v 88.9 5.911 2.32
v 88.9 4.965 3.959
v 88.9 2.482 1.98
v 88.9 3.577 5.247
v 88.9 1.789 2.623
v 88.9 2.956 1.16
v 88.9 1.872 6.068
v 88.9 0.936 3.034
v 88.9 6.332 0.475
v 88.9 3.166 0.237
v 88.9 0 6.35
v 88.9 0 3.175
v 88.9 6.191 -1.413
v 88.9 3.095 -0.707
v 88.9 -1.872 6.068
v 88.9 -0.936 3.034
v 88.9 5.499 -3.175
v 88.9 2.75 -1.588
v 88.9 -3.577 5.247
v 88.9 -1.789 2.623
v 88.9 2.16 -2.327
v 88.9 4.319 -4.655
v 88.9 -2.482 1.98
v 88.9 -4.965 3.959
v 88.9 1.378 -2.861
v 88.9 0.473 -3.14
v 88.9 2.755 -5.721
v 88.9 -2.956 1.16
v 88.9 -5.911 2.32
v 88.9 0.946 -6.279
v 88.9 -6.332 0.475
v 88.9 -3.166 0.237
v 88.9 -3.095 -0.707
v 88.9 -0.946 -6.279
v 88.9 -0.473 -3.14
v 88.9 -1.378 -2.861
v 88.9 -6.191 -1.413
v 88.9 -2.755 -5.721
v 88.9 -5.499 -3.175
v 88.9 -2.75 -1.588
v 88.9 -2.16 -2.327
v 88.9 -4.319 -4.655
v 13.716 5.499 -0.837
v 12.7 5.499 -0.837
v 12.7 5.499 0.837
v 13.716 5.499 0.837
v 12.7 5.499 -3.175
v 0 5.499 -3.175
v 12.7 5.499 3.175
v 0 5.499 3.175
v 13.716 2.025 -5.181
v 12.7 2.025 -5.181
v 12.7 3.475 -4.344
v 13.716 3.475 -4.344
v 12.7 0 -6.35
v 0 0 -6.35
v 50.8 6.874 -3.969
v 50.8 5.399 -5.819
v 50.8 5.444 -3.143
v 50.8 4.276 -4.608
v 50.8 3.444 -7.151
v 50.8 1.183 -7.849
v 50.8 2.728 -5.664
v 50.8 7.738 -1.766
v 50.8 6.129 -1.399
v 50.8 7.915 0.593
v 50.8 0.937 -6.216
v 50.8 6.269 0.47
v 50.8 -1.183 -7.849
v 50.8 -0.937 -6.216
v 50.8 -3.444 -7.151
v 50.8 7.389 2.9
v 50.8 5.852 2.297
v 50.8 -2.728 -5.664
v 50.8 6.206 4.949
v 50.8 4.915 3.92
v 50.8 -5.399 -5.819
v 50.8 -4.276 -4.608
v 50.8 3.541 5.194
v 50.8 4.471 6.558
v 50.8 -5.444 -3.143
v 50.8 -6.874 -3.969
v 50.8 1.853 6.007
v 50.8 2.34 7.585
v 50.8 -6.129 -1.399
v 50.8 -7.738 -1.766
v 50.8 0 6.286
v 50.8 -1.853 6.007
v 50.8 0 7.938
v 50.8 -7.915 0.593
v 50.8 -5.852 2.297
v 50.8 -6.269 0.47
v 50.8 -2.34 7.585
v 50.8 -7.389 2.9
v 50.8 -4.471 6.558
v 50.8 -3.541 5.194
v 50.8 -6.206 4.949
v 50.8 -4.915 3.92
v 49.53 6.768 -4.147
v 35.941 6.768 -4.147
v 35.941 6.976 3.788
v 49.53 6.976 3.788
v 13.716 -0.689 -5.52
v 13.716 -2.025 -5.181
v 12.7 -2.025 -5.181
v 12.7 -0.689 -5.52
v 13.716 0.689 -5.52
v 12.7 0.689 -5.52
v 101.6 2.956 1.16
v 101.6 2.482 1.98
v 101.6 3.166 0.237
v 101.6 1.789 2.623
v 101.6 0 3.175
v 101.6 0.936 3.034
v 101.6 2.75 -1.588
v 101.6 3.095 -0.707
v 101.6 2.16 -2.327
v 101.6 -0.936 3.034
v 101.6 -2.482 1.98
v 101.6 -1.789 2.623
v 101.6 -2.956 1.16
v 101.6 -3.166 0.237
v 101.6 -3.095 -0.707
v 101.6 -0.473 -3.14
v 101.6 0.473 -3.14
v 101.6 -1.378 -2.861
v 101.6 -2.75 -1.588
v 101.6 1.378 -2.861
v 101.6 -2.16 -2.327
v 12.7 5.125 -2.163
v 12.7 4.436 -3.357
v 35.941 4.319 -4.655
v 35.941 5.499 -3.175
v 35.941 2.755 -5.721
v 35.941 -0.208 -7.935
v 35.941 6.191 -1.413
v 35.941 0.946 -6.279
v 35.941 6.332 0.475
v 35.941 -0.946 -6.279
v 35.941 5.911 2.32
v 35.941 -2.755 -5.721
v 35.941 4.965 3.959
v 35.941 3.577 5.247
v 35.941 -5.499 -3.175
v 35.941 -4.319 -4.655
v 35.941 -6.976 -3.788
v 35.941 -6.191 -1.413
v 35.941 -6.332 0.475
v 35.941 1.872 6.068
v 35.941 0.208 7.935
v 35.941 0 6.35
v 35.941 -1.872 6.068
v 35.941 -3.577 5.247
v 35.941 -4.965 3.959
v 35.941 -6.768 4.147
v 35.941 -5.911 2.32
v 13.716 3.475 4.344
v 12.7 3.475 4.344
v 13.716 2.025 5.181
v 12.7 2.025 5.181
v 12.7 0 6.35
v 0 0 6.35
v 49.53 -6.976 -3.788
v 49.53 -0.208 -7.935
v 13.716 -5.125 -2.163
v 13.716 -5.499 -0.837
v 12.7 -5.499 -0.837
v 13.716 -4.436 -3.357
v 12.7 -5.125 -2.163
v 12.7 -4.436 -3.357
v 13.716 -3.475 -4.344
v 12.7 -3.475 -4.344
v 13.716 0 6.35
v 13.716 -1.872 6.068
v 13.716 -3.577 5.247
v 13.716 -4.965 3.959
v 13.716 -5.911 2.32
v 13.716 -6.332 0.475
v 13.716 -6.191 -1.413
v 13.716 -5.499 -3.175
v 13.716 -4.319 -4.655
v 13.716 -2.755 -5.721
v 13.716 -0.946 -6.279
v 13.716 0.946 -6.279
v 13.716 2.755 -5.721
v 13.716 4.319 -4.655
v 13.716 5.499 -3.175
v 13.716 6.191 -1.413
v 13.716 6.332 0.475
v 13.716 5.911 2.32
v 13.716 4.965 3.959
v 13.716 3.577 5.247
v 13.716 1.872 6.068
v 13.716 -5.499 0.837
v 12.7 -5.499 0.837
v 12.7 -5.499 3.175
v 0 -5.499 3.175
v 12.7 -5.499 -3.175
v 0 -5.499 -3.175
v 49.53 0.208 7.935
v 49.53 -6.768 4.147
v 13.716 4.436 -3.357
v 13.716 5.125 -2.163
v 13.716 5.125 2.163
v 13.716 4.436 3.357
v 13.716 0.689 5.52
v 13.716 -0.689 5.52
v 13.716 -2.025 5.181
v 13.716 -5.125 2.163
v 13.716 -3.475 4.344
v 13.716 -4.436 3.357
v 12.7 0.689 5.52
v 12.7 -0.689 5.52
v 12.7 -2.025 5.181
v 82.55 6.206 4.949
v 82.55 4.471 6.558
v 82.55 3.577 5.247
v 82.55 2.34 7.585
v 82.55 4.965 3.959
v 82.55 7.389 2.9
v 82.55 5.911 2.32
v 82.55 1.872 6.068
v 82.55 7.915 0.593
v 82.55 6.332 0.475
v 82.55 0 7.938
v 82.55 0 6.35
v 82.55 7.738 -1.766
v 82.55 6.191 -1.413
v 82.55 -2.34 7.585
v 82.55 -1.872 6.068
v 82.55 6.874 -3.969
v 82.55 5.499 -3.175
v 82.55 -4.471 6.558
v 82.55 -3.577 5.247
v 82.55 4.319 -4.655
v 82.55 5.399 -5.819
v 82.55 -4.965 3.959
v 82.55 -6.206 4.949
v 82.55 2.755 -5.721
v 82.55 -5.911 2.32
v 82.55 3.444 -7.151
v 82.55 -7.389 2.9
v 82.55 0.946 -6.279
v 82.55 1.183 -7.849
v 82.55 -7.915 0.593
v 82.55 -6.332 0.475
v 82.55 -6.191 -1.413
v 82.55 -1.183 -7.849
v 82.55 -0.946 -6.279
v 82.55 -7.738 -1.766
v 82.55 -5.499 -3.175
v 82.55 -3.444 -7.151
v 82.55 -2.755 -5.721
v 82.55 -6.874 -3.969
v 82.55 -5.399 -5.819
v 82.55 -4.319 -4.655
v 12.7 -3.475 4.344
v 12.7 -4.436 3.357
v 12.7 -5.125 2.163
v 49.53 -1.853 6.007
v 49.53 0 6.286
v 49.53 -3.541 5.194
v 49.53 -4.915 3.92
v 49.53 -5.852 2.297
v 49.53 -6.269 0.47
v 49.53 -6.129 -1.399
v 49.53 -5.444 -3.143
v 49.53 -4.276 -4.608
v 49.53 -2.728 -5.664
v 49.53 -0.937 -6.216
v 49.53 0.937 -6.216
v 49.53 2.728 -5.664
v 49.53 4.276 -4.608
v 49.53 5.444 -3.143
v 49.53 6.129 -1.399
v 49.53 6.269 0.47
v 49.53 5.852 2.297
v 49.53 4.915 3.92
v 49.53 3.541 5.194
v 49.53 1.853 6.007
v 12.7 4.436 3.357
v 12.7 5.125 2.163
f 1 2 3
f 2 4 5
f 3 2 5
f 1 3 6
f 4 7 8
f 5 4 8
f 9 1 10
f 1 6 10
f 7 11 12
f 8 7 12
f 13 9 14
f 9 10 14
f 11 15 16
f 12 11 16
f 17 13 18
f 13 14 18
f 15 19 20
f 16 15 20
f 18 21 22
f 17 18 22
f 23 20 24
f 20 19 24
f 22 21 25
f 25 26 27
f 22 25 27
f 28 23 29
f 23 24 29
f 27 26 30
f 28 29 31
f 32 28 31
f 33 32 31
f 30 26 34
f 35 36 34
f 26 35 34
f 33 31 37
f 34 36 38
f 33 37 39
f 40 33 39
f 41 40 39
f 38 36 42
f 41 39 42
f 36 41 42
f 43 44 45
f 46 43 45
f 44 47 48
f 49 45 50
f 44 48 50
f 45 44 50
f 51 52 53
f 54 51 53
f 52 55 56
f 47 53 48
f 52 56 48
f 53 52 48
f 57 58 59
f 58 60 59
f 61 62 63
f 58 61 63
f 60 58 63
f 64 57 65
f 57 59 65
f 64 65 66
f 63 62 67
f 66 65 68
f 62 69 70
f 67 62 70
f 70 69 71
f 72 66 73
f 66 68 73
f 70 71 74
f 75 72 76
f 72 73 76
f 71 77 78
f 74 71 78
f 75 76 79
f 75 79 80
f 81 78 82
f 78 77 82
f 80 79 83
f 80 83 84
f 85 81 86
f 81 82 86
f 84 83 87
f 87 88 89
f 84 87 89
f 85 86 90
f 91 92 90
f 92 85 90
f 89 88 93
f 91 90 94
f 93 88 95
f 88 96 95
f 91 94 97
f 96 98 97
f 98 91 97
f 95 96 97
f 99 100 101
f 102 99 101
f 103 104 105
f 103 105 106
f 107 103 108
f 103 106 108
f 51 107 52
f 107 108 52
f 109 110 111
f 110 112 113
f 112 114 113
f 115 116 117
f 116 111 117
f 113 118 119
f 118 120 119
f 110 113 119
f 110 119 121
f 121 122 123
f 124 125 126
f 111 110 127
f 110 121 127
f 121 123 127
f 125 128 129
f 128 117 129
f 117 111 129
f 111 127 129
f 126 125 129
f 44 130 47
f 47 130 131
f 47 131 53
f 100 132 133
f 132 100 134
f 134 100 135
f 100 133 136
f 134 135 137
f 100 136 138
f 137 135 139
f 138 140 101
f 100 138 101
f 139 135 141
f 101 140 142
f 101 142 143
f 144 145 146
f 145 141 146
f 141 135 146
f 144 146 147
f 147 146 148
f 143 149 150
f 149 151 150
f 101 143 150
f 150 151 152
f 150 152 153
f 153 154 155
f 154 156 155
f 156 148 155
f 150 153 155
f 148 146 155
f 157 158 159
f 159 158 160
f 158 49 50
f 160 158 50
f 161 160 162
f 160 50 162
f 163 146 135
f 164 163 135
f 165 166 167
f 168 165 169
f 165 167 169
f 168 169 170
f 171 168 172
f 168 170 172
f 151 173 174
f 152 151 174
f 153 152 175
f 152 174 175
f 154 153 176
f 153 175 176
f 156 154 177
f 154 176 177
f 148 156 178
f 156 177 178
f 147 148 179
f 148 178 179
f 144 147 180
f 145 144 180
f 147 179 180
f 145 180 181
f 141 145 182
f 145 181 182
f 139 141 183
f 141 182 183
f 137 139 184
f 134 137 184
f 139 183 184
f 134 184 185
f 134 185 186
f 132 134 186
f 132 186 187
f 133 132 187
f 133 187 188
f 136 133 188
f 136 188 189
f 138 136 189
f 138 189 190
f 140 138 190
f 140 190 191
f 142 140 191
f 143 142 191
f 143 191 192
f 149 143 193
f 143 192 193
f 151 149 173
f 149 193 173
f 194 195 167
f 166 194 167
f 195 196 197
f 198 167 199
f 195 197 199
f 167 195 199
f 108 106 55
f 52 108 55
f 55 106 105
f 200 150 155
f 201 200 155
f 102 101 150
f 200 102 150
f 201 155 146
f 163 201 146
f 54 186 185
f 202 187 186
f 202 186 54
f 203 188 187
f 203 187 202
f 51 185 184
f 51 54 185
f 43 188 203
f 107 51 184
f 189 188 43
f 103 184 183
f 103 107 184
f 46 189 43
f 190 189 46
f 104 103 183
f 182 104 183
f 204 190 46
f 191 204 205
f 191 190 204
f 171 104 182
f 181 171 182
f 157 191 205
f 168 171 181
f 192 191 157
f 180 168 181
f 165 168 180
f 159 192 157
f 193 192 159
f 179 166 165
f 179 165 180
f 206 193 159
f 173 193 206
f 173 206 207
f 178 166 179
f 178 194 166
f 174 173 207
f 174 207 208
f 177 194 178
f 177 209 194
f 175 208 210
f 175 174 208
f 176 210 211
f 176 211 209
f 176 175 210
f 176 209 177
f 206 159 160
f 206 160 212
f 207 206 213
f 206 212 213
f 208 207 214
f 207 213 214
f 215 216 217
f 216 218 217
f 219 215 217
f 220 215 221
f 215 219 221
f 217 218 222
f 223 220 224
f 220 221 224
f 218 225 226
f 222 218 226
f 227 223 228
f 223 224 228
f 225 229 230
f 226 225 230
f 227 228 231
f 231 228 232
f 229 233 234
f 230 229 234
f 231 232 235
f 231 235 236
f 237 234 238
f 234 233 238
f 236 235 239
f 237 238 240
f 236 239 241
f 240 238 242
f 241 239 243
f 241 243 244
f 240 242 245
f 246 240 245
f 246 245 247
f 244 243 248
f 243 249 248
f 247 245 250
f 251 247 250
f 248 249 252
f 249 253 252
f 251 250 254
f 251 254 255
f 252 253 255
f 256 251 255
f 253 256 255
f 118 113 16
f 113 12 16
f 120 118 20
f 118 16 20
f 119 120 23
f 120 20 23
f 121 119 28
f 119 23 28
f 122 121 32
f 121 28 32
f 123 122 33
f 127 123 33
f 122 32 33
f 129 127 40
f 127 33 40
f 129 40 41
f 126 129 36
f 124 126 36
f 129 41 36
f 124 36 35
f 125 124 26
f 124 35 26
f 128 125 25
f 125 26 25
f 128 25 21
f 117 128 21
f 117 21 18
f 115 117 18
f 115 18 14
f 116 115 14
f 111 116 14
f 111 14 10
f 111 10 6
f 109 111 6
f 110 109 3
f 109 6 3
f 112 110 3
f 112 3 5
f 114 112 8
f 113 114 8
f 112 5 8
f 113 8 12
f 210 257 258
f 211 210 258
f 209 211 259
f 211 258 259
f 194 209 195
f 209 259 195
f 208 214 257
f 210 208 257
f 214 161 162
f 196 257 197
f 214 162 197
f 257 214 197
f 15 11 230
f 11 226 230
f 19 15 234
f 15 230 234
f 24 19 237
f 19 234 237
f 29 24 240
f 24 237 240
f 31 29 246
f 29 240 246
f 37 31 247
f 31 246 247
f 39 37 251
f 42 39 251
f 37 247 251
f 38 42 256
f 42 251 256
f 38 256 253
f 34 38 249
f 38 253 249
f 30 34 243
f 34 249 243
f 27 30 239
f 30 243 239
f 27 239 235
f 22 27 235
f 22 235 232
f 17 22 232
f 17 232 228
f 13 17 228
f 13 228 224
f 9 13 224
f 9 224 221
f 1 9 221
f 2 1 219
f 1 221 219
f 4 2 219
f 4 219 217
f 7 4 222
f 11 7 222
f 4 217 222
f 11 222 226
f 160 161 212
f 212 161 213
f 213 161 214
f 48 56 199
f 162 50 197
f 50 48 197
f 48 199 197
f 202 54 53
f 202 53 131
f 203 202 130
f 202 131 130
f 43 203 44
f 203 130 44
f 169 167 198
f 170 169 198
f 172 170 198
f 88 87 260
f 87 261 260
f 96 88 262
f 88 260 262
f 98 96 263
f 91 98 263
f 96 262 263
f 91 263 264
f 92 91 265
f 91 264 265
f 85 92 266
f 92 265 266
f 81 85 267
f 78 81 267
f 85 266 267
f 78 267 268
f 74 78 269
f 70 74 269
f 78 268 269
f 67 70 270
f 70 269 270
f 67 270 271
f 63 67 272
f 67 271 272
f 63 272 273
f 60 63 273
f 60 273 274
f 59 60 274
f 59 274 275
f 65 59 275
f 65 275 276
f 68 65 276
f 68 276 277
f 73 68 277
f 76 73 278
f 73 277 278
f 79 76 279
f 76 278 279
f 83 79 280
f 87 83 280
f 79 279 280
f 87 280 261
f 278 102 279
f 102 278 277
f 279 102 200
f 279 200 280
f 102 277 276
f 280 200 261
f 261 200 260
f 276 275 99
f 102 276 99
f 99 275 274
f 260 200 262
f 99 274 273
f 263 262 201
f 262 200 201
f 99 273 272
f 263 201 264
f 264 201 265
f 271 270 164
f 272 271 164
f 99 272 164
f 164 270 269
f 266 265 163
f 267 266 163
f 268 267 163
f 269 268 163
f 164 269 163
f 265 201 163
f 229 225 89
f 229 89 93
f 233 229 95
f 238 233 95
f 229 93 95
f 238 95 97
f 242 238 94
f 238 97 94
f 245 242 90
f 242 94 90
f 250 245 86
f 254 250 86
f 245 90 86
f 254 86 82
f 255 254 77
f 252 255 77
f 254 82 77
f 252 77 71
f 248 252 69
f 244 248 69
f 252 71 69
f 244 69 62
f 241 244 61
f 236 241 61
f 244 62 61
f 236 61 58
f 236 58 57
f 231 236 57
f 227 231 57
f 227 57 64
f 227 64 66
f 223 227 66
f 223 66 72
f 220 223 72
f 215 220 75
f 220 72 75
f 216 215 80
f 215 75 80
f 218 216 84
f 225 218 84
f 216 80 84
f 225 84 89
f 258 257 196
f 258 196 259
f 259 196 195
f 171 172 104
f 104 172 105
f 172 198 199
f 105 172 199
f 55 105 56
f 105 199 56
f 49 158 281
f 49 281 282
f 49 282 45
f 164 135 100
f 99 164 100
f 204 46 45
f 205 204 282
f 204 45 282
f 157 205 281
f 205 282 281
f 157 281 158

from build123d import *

# Parameters (mm, degrees)
F3_DEPTH = 13.716
F5_DEPTH = 13.589


with BuildPart() as f1:
    # F0 (on Front) → F1 (revolve)
    with BuildSketch(Plane.XZ):
        Polygon((0, 6.35), (0, 0), (101.6, 0), (101.6, 3.175), (88.9, 3.175), (88.9, 6.35), (82.55, 6.35), (82.55, 7.9375), (50.8, 7.9375), (50.8, 6.2865), (49.53, 6.2865), (49.53, 7.9375), (35.941, 7.9375), (35.941, 6.35), (13.716, 6.35), (13.716, 5.5626), (12.7, 5.5626), (12.7, 6.35), align=None)
    revolve(axis=Axis((121.0162361984, 0, 0), (1, 0, 0)))

    # F2 (on face) → F3 (cut)
    with BuildSketch(Plane(origin=(0, 0, 0), x_dir=(0, -1, 0), z_dir=(-1, 0, 0))):
        with BuildLine():
            Line((0, 6.35), (5.499261314, 3.175))
            ThreePointArc((5.499261314, 3.175), (3.175, 5.499261314), (0, 6.35))
        make_face()
        with BuildLine():
            Line((5.499261314, 3.175), (5.499261314, -3.175))
            ThreePointArc((5.499261314, -3.175), (6.1336289969, -1.6435009364), (6.35, 0))
            ThreePointArc((6.35, 0), (6.1336289969, 1.6435009364), (5.499261314, 3.175))
        make_face()
        with BuildLine():
            Line((5.499261314, -3.175), (0, -6.35))
            ThreePointArc((0, -6.35), (3.175, -5.499261314), (5.499261314, -3.175))
        make_face()
        with BuildLine():
            ThreePointArc((-5.499261314, -3.175), (-3.175, -5.499261314), (0, -6.35))
            Line((0, -6.35), (-5.499261314, -3.175))
        make_face()
        with BuildLine():
            ThreePointArc((-5.499261314, 3.175), (-6.35, 0), (-5.499261314, -3.175))
            Line((-5.499261314, -3.175), (-5.499261314, 3.175))
        make_face()
        with BuildLine():
            ThreePointArc((0, 6.35), (-3.175, 5.499261314), (-5.499261314, 3.175))
            Line((-5.499261314, 3.175), (0, 6.35))
        make_face()
    extrude(amount=-F3_DEPTH, mode=Mode.SUBTRACT)

    # F4 (on face) → F5 (cut, through all)
    with BuildSketch(Plane(origin=(35.941, 0, 0), x_dir=(0, -1, 0), z_dir=(-1, 0, 0))):
        with BuildLine():
            Line((6.7679427578, 4.1471504768), (6.9755090451, -3.7876351213))
            ThreePointArc((6.9755090451, -3.7876351213), (7.6932440913, -1.953945138), (7.9375, 0))
            ThreePointArc((7.9375, 0), (7.6395173895, 2.1544559185), (6.7679427578, 4.1471504768))
        make_face()
        with BuildLine():
            ThreePointArc((6.7679427578, 4.1471504768), (3.7876351213, 6.9755090451), (-0.2075662873, 7.934785598))
            Line((-0.2075662873, 7.934785598), (6.7679427578, 4.1471504768))
        make_face()
        with BuildLine():
            ThreePointArc((-0.2075662873, 7.934785598), (-4.1471504768, 6.7679427578), (-6.9755090451, 3.7876351213))
            Line((-6.9755090451, 3.7876351213), (-0.2075662873, 7.934785598))
        make_face()
        with BuildLine():
            ThreePointArc((-6.9755090451, 3.7876351213), (-7.934785598, -0.2075662873), (-6.7679427578, -4.1471504768))
            Line((-6.7679427578, -4.1471504768), (-6.9755090451, 3.7876351213))
        make_face()
        with BuildLine():
            Line((6.9755090451, -3.7876351213), (0.2075662873, -7.934785598))
            ThreePointArc((0.2075662873, -7.934785598), (4.1471504768, -6.7679427578), (6.9755090451, -3.7876351213))
        make_face()
        with BuildLine():
            Line((0.2075662873, -7.934785598), (-6.7679427578, -4.1471504768))
            ThreePointArc((-6.7679427578, -4.1471504768), (-3.7876351213, -6.9755090451), (0.2075662873, -7.934785598))
        make_face()
    extrude(amount=-F5_DEPTH, mode=Mode.SUBTRACT)


solid = f1.part
